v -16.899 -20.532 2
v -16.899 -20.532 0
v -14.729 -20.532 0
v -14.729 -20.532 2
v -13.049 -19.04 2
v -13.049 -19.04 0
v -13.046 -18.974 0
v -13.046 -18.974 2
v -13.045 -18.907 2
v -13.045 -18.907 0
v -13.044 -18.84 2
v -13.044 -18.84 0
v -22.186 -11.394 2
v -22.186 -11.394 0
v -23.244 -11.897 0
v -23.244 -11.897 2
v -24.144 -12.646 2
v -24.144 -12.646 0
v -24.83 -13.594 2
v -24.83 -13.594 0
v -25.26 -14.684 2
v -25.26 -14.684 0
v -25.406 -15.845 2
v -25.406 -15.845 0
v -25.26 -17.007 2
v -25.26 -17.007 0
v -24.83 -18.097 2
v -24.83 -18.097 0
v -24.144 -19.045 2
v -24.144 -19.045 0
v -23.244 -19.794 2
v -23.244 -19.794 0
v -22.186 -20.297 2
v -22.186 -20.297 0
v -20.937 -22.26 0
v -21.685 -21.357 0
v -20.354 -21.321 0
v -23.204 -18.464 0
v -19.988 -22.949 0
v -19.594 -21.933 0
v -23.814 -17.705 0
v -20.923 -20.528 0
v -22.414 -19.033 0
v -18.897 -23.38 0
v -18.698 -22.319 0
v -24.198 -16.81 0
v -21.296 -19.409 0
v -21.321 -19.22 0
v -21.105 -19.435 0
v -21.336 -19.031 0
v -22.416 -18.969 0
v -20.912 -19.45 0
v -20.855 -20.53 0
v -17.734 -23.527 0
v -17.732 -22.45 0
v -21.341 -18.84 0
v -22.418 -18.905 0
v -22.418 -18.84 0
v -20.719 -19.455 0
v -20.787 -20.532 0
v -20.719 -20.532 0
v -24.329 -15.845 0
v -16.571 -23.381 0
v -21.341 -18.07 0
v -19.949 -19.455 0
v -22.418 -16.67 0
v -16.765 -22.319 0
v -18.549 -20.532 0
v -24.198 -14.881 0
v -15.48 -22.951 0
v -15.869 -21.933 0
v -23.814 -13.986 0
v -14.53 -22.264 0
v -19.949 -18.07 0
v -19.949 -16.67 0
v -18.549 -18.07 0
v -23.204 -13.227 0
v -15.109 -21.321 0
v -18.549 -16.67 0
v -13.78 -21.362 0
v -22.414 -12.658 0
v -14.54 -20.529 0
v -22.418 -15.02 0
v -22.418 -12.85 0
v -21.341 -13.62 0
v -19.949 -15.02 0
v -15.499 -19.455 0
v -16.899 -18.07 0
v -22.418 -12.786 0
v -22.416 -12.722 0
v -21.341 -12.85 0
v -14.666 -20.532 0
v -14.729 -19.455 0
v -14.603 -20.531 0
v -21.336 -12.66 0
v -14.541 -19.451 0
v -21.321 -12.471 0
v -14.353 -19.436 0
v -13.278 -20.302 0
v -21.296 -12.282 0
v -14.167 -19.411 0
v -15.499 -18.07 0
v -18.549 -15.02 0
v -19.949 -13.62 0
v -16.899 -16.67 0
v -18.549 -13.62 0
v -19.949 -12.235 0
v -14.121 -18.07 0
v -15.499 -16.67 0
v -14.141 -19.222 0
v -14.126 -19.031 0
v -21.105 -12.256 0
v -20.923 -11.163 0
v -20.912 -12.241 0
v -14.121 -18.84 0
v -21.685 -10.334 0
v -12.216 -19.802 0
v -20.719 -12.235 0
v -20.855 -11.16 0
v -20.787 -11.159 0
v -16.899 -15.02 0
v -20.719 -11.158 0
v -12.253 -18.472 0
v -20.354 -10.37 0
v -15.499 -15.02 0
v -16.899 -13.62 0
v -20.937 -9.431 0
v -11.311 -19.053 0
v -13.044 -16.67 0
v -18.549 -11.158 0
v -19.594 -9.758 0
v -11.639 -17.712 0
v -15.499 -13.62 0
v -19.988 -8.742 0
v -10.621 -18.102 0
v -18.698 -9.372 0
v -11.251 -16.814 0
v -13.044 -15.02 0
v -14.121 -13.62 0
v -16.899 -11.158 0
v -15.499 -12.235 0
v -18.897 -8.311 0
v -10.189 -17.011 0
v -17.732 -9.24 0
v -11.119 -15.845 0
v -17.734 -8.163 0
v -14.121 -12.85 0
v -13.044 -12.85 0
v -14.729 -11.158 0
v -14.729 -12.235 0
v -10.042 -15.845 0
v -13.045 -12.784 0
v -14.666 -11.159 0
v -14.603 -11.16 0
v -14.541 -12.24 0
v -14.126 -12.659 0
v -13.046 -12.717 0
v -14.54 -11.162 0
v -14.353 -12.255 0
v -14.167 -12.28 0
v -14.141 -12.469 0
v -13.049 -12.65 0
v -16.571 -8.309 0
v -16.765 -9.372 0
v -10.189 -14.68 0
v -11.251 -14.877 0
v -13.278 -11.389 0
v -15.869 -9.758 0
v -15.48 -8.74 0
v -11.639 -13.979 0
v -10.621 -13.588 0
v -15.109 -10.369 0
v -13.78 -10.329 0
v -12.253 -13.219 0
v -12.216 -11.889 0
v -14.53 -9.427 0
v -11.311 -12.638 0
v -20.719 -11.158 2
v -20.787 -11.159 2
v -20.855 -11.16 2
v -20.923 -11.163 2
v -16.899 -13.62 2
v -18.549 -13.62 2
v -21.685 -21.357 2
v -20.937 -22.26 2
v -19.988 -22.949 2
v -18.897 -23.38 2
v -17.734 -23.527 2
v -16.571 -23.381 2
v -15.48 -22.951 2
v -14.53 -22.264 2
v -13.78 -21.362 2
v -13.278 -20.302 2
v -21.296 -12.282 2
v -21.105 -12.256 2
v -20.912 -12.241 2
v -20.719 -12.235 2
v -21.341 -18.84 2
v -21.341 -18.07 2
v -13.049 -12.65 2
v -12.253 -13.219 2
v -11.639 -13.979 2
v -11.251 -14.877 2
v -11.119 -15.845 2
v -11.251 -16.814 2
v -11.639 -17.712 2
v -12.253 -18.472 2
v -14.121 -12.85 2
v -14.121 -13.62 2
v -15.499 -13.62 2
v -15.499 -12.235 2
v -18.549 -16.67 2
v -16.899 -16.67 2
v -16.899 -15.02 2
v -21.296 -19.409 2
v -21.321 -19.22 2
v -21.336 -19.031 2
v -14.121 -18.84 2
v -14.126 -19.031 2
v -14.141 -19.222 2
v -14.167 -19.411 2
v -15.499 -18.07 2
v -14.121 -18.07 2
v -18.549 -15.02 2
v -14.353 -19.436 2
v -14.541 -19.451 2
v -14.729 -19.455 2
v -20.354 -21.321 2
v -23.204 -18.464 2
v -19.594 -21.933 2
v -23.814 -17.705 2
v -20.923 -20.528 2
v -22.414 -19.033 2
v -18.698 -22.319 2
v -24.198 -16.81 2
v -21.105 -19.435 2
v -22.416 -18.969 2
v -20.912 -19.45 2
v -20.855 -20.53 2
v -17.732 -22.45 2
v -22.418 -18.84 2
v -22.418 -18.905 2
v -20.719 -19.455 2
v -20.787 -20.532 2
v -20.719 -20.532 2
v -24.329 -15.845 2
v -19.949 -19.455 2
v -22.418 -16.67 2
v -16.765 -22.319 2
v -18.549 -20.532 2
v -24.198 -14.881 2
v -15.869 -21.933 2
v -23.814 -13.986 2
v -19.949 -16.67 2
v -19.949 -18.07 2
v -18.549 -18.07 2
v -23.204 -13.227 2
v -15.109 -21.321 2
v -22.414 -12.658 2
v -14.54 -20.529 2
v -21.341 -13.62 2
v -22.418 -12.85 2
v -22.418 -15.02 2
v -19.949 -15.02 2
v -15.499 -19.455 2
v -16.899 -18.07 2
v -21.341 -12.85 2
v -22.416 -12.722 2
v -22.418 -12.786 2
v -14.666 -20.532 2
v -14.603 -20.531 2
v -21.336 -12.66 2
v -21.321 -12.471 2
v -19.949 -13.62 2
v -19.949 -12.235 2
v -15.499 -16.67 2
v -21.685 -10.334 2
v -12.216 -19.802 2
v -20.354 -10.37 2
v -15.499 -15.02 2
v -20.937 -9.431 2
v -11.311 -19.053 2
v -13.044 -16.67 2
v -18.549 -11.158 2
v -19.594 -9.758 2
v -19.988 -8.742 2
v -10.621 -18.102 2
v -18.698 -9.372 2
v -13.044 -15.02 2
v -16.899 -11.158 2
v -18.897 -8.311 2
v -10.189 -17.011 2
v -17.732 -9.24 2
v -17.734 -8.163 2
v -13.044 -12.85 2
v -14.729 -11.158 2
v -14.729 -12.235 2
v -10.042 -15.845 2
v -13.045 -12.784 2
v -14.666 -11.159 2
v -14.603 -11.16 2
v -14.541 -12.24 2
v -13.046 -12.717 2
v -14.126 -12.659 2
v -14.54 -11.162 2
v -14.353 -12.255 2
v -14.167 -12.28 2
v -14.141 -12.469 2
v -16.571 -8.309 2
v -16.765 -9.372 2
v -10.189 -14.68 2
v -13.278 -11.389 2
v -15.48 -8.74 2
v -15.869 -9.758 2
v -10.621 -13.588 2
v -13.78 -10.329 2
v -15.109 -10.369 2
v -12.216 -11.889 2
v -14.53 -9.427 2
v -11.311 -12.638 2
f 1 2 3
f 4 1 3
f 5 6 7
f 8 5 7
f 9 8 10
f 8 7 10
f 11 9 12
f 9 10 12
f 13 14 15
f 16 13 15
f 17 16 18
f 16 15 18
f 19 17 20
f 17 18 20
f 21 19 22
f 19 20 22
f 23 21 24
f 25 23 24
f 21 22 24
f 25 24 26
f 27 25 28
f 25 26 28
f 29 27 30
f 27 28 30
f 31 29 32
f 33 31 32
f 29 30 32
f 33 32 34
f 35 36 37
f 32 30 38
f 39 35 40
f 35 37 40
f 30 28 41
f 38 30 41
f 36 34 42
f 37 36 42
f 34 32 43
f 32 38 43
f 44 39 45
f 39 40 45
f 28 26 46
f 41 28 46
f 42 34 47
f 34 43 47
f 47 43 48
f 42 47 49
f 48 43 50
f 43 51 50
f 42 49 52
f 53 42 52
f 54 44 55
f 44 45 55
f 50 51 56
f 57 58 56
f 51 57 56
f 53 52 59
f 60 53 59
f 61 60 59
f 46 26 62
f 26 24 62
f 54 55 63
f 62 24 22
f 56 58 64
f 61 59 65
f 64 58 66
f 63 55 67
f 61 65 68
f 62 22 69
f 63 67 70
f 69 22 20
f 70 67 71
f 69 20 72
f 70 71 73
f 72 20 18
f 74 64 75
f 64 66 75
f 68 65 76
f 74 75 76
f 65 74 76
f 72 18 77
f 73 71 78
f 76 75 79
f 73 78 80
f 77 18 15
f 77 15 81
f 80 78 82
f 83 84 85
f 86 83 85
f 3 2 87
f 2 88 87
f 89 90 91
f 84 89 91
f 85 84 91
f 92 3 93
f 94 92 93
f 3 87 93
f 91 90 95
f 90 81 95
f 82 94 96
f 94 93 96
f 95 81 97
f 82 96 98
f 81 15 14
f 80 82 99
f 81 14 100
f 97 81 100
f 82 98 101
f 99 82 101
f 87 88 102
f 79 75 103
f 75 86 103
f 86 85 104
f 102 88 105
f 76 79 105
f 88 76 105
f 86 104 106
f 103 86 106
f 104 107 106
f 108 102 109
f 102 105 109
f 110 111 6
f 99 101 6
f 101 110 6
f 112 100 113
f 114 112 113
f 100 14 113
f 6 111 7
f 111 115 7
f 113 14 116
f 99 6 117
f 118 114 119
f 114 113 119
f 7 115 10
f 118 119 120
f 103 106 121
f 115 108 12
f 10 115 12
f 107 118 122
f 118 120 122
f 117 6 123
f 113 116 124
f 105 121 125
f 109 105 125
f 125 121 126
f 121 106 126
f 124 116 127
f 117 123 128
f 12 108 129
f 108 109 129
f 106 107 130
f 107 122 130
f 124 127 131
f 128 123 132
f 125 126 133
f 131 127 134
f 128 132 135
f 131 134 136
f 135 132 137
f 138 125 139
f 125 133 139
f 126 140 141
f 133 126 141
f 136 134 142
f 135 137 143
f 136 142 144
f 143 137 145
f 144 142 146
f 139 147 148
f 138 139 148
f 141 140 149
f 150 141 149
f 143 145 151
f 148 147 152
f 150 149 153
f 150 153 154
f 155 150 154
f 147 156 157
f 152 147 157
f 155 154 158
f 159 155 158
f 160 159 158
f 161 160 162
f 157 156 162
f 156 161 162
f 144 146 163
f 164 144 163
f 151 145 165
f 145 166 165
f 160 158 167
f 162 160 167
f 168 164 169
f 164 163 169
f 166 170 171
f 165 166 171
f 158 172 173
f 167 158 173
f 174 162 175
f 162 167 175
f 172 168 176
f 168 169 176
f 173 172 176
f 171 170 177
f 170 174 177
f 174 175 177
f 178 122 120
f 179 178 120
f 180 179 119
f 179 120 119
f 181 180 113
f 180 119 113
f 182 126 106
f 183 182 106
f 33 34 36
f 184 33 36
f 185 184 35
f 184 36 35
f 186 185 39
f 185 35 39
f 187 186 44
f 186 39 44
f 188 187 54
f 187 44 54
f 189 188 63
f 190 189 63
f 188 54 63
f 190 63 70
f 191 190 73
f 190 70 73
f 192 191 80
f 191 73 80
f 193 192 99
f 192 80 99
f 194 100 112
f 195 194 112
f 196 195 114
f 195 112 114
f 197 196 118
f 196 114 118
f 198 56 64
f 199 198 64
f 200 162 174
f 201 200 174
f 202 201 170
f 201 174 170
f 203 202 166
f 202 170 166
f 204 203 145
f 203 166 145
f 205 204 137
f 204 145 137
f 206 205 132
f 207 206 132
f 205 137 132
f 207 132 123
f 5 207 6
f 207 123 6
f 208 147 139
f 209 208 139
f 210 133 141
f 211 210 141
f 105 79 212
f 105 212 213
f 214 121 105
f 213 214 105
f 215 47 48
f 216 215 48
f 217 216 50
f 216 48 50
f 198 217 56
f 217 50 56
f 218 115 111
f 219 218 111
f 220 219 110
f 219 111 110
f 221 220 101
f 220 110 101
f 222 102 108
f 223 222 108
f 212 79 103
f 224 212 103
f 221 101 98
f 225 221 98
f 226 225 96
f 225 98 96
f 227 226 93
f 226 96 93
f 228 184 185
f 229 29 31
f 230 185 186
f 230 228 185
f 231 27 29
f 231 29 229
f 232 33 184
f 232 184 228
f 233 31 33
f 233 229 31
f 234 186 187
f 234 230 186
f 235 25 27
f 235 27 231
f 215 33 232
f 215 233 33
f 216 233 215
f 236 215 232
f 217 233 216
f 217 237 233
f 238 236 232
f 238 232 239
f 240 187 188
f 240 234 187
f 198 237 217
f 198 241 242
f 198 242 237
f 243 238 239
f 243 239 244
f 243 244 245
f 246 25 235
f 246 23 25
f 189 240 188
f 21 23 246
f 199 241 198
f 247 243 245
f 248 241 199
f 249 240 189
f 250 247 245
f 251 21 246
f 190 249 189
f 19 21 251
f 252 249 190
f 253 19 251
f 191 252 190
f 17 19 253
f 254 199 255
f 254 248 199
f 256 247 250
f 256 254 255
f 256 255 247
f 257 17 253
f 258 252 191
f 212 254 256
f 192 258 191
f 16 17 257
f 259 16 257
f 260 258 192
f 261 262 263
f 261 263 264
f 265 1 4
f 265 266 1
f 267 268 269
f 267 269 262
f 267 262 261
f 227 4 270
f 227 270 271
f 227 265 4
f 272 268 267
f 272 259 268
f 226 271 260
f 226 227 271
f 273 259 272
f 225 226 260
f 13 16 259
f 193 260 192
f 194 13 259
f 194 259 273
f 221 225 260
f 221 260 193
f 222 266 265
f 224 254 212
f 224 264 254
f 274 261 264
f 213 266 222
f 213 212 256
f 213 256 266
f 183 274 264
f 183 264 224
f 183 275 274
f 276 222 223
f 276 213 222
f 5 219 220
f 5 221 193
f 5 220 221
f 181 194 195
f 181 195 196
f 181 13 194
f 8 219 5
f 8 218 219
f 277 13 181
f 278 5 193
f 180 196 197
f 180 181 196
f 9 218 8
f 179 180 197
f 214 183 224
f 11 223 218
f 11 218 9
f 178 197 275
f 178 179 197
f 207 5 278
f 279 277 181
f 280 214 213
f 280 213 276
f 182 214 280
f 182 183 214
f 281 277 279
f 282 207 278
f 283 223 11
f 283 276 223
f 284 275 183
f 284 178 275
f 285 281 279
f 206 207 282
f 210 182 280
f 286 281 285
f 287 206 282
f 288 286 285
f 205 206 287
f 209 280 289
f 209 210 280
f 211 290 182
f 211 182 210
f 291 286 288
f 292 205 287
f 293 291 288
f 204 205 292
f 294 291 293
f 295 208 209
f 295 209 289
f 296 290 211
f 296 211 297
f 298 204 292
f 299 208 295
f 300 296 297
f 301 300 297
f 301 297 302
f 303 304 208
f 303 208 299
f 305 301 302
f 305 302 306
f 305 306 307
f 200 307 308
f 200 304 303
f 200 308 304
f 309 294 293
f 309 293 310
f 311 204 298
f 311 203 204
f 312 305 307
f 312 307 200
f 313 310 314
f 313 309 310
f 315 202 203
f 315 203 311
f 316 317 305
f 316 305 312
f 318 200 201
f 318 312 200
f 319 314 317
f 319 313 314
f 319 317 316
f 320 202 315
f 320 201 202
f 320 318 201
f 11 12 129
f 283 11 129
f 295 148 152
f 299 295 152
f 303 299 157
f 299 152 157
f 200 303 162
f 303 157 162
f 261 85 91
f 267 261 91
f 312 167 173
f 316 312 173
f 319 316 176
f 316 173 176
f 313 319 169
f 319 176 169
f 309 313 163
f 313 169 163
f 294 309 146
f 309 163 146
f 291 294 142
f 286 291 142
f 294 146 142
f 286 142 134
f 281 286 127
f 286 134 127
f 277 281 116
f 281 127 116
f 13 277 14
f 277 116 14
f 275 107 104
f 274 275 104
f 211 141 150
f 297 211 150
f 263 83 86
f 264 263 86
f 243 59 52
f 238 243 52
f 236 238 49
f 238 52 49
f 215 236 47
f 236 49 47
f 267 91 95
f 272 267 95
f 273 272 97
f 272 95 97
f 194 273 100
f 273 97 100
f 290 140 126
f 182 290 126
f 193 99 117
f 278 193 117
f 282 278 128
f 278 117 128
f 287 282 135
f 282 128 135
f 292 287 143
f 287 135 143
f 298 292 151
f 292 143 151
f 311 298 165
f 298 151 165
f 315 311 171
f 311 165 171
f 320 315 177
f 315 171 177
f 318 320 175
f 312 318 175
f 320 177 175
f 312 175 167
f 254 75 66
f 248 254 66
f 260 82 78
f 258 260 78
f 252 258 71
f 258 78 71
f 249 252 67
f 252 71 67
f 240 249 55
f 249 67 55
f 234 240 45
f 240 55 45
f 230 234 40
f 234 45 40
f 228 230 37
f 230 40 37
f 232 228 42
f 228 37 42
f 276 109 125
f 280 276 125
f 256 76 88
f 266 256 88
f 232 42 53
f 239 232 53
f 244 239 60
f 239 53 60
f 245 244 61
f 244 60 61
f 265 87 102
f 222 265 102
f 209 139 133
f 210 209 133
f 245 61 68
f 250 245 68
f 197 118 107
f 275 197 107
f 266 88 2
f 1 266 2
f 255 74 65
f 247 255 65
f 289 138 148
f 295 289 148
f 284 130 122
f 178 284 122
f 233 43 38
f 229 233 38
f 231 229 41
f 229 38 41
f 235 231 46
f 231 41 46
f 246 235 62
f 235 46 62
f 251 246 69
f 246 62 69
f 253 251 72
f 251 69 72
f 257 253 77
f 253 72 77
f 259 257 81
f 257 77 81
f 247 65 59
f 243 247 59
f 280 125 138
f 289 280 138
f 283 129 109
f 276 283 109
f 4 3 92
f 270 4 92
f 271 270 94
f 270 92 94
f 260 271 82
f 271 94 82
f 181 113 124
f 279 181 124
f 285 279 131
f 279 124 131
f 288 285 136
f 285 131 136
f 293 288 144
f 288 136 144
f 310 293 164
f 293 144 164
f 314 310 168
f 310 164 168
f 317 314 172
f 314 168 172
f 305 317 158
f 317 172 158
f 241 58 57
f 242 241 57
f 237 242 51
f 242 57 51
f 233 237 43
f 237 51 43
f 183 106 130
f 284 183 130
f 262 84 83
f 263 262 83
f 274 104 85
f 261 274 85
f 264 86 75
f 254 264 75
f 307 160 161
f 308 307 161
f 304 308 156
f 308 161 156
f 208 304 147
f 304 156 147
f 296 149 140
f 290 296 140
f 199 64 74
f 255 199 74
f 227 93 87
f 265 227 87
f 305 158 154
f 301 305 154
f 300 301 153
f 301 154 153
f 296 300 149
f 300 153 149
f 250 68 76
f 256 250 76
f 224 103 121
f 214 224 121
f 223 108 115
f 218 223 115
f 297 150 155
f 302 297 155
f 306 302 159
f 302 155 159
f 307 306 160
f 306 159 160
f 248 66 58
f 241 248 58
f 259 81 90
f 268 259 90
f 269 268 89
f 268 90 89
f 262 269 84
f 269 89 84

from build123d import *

# Parameters (mm, degrees)
F0_W     = 1.4
F0_H     = 1.4
F0_W_2   = 1.65
F0_H_2   = 1.65
F1_DEPTH = 2


with BuildPart() as f1:
    # F0 (on Top) → F1 (new body)
    with BuildSketch(Plane.XY):
        with BuildLine():
            ThreePointArc((-21.2961866601, -12.2818885401), (-21.155367688, -11.7070138204), (-20.9225061022, -11.1628755952))
            ThreePointArc((-20.9225061022, -11.1628755952), (-21.5623124485, -11.234937617), (-22.186206323, -11.3940021608))
            ThreePointArc((-22.186206323, -11.3940021608), (-22.3437732086, -12.0182759568), (-22.4142996364, -12.6582533929))
            ThreePointArc((-22.4142996364, -12.6582533929), (-21.8707217917, -12.4240866724), (-21.2961866601, -12.2818885401))
        make_face()
        with BuildLine():
            ThreePointArc((-22.186206323, -11.3940021608), (-21.5623124485, -11.234937617), (-20.9225061022, -11.1628755952))
            ThreePointArc((-20.9225061022, -11.1628755952), (-17.7315900511, -9.2404582472), (-14.5403036541, -11.1622607443))
            ThreePointArc((-14.5403036541, -11.1622607443), (-13.9013713953, -11.2321194541), (-13.278004152, -11.3887334725))
            ThreePointArc((-13.278004152, -11.3887334725), (-17.7340143596, -8.1634590502), (-22.186206323, -11.3940021608))
        make_face()
        with BuildLine():
            ThreePointArc((-22.4142996364, -12.6582533929), (-22.3437732086, -12.0182759568), (-22.186206323, -11.3940021608))
            ThreePointArc((-22.186206323, -11.3940021608), (-25.4060635692, -15.8454582305), (-22.186206323, -20.2969143001))
            ThreePointArc((-22.186206323, -20.2969143001), (-22.3437732086, -19.6726405041), (-22.4142996364, -19.032663068))
            ThreePointArc((-22.4142996364, -19.032663068), (-24.3290635692, -15.8454582305), (-22.4142996364, -12.6582533929))
        make_face()
        with BuildLine():
            ThreePointArc((-13.278004152, -11.3887334725), (-13.9013713953, -11.2321194541), (-14.5403036541, -11.1622607443))
            ThreePointArc((-14.5403036541, -11.1622607443), (-14.3076050054, -11.7055530453), (-14.1666742594, -12.2795336289))
            ThreePointArc((-14.1666742594, -12.2795336289), (-13.5923579293, -12.4190898486), (-13.0485100994, -12.6504871765))
            ThreePointArc((-13.0485100994, -12.6504871765), (-13.1198982272, -12.011723992), (-13.278004152, -11.3887334725))
        make_face()
        with BuildLine():
            ThreePointArc((-22.4142996364, -19.032663068), (-22.3437732086, -19.6726405041), (-22.186206323, -20.2969143001))
            ThreePointArc((-22.186206323, -20.2969143001), (-21.5623124485, -20.455978844), (-20.9225061022, -20.5280408657))
            ThreePointArc((-20.9225061022, -20.5280408657), (-21.155367688, -19.9839026405), (-21.2961866601, -19.4090279208))
            ThreePointArc((-21.2961866601, -19.4090279208), (-21.8707217917, -19.2668297885), (-22.4142996364, -19.032663068))
        make_face()
        with BuildLine():
            ThreePointArc((-20.9225061022, -20.5280408657), (-21.5623124485, -20.455978844), (-22.186206323, -20.2969143001))
            ThreePointArc((-22.186206323, -20.2969143001), (-17.7340143596, -23.5274574107), (-13.278004152, -20.3021829884))
            ThreePointArc((-13.278004152, -20.3021829884), (-13.9013713953, -20.4587970068), (-14.5403036541, -20.5286557166))
            ThreePointArc((-14.5403036541, -20.5286557166), (-17.7315900511, -22.4504582137), (-20.9225061022, -20.5280408657))
        make_face()
        with BuildLine():
            ThreePointArc((-13.278004152, -20.3021829884), (-10.0420635692, -15.8454582305), (-13.278004152, -11.3887334725))
            ThreePointArc((-13.278004152, -11.3887334725), (-13.1198982272, -12.011723992), (-13.0485100994, -12.6504871765))
            ThreePointArc((-13.0485100994, -12.6504871765), (-11.1190635692, -15.8454582305), (-13.0485100994, -19.0404292844))
            ThreePointArc((-13.0485100994, -19.0404292844), (-13.1198982272, -19.6791924689), (-13.278004152, -20.3021829884))
        make_face()
        with BuildLine():
            ThreePointArc((-14.5403036541, -20.5286557166), (-13.9013713953, -20.4587970068), (-13.278004152, -20.3021829884))
            ThreePointArc((-13.278004152, -20.3021829884), (-13.1198982272, -19.6791924689), (-13.0485100994, -19.0404292844))
            ThreePointArc((-13.0485100994, -19.0404292844), (-13.5923579293, -19.2718266123), (-14.1666742594, -19.4113828321))
            ThreePointArc((-14.1666742594, -19.4113828321), (-14.3076050054, -19.9853634156), (-14.5403036541, -20.5286557166))
        make_face()
        with BuildLine():
            ThreePointArc((-21.3412422696, -12.8504582305), (-21.3299607394, -12.565282188), (-21.2961866601, -12.2818885401))
            ThreePointArc((-21.2961866601, -12.2818885401), (-21.8707217917, -12.4240866724), (-22.4142996364, -12.6582533929))
            ThreePointArc((-22.4142996364, -12.6582533929), (-22.4172565076, -12.7543355953), (-22.4182422696, -12.8504582305))
            Line((-22.4182422696, -12.8504582305), (-22.4182422696, -15.0204582305))
            Line((-22.4182422696, -15.0204582305), (-19.9490635692, -15.0204582305))
            Line((-19.9490635692, -15.0204582305), (-19.9490635692, -13.6204582305))
            Line((-19.9490635692, -13.6204582305), (-21.3412422696, -13.6204582305))
            Line((-21.3412422696, -13.6204582305), (-21.3412422696, -12.8504582305))
        make_face()
        with Locations((-19.2490635692, -14.3204582305)):
            Rectangle(F0_W, F0_H)
        with BuildLine():
            Line((-18.5490635692, -11.1584582305), (-20.7190635692, -11.1584582305))
            ThreePointArc((-20.7190635692, -11.1584582305), (-20.8208088115, -11.1595627018), (-20.9225061022, -11.1628755952))
            ThreePointArc((-20.9225061022, -11.1628755952), (-21.155367688, -11.7070138204), (-21.2961866601, -12.2818885401))
            ThreePointArc((-21.2961866601, -12.2818885401), (-21.0085574533, -12.2470845296), (-20.7190635692, -12.2354582305))
            Line((-20.7190635692, -12.2354582305), (-19.9490635692, -12.2354582305))
            Line((-19.9490635692, -12.2354582305), (-19.9490635692, -13.6204582305))
            Line((-19.9490635692, -13.6204582305), (-18.5490635692, -13.6204582305))
            Line((-18.5490635692, -13.6204582305), (-18.5490635692, -11.1584582305))
        make_face()
        with Locations((-17.7240635692, -14.3204582305)):
            Rectangle(F0_W_2, F0_H)
        with Locations((-16.1990635692, -14.3204582305)):
            Rectangle(F0_W, F0_H)
        with BuildLine():
            ThreePointArc((-13.0485100994, -12.6504871765), (-13.5923579293, -12.4190898486), (-14.1666742594, -12.2795336289))
            ThreePointArc((-14.1666742594, -12.2795336289), (-14.1326181911, -12.5640935301), (-14.1212422696, -12.8504582305))
            Line((-14.1212422696, -12.8504582305), (-14.1212422696, -13.6204582305))
            Line((-14.1212422696, -13.6204582305), (-15.4990635692, -13.6204582305))
            Line((-15.4990635692, -13.6204582305), (-15.4990635692, -15.0204582305))
            Line((-15.4990635692, -15.0204582305), (-13.0442422696, -15.0204582305))
            Line((-13.0442422696, -15.0204582305), (-13.0442422696, -12.8504582305))
            ThreePointArc((-13.0442422696, -12.8504582305), (-13.0453093485, -12.7504499348), (-13.0485100994, -12.6504871765))
        make_face()
        with BuildLine():
            ThreePointArc((-14.1666742594, -12.2795336289), (-14.3076050054, -11.7055530453), (-14.5403036541, -11.1622607443))
            ThreePointArc((-14.5403036541, -11.1622607443), (-14.6346644635, -11.1594089553), (-14.7290635692, -11.1584582305))
            Line((-14.7290635692, -11.1584582305), (-16.8990635692, -11.1584582305))
            Line((-16.8990635692, -11.1584582305), (-16.8990635692, -13.6204582305))
            Line((-16.8990635692, -13.6204582305), (-15.4990635692, -13.6204582305))
            Line((-15.4990635692, -13.6204582305), (-15.4990635692, -12.2354582305))
            Line((-15.4990635692, -12.2354582305), (-14.7290635692, -12.2354582305))
            ThreePointArc((-14.7290635692, -12.2354582305), (-14.4470066704, -12.2464939481), (-14.1666742594, -12.2795336289))
        make_face()
        with BuildLine():
            ThreePointArc((-14.7290635692, -20.5324582305), (-14.6346644635, -20.5315075056), (-14.5403036541, -20.5286557166))
            ThreePointArc((-14.5403036541, -20.5286557166), (-14.3076050054, -19.9853634156), (-14.1666742594, -19.4113828321))
            ThreePointArc((-14.1666742594, -19.4113828321), (-14.4470066704, -19.4444225128), (-14.7290635692, -19.4554582305))
            Line((-14.7290635692, -19.4554582305), (-15.4990635692, -19.4554582305))
            Line((-15.4990635692, -19.4554582305), (-15.4990635692, -18.0704582305))
            Line((-15.4990635692, -18.0704582305), (-16.8990635692, -18.0704582305))
            Line((-16.8990635692, -18.0704582305), (-16.8990635692, -20.5324582305))
            Line((-16.8990635692, -20.5324582305), (-14.7290635692, -20.5324582305))
        make_face()
        with BuildLine():
            ThreePointArc((-14.1666742594, -19.4113828321), (-13.5923579293, -19.2718266123), (-13.0485100994, -19.0404292844))
            ThreePointArc((-13.0485100994, -19.0404292844), (-13.0453093485, -18.9404665261), (-13.0442422696, -18.8404582305))
            Line((-13.0442422696, -18.8404582305), (-13.0442422696, -16.6704582305))
            Line((-13.0442422696, -16.6704582305), (-15.4990635692, -16.6704582305))
            Line((-15.4990635692, -16.6704582305), (-15.4990635692, -18.0704582305))
            Line((-15.4990635692, -18.0704582305), (-14.1212422696, -18.0704582305))
            Line((-14.1212422696, -18.0704582305), (-14.1212422696, -18.8404582305))
            ThreePointArc((-14.1212422696, -18.8404582305), (-14.1326181911, -19.1268229308), (-14.1666742594, -19.4113828321))
        make_face()
        with Locations((-16.1990635692, -17.3704582305)):
            Rectangle(F0_W, F0_H)
        with Locations((-16.1990635692, -15.8454582305)):
            Rectangle(F0_W, F0_H_2)
        with Locations((-19.2490635692, -17.3704582305)):
            Rectangle(F0_W, F0_H)
        with Locations((-19.2490635692, -15.8454582305)):
            Rectangle(F0_W, F0_H_2)
        with Locations((-17.7240635692, -17.3704582305)):
            Rectangle(F0_W_2, F0_H)
        with BuildLine():
            ThreePointArc((-21.2961866601, -19.4090279208), (-21.155367688, -19.9839026405), (-20.9225061022, -20.5280408657))
            ThreePointArc((-20.9225061022, -20.5280408657), (-20.8208088115, -20.5313537591), (-20.7190635692, -20.5324582305))
            Line((-20.7190635692, -20.5324582305), (-18.5490635692, -20.5324582305))
            Line((-18.5490635692, -20.5324582305), (-18.5490635692, -18.0704582305))
            Line((-18.5490635692, -18.0704582305), (-19.9490635692, -18.0704582305))
            Line((-19.9490635692, -18.0704582305), (-19.9490635692, -19.4554582305))
            Line((-19.9490635692, -19.4554582305), (-20.7190635692, -19.4554582305))
            ThreePointArc((-20.7190635692, -19.4554582305), (-21.0085574533, -19.4438319313), (-21.2961866601, -19.4090279208))
        make_face()
        with BuildLine():
            ThreePointArc((-22.4182422696, -18.8404582305), (-22.4172565076, -18.9365808656), (-22.4142996364, -19.032663068))
            ThreePointArc((-22.4142996364, -19.032663068), (-21.8707217917, -19.2668297885), (-21.2961866601, -19.4090279208))
            ThreePointArc((-21.2961866601, -19.4090279208), (-21.3299607394, -19.1256342729), (-21.3412422696, -18.8404582305))
            Line((-21.3412422696, -18.8404582305), (-21.3412422696, -18.0704582305))
            Line((-21.3412422696, -18.0704582305), (-19.9490635692, -18.0704582305))
            Line((-19.9490635692, -18.0704582305), (-19.9490635692, -16.6704582305))
            Line((-19.9490635692, -16.6704582305), (-22.4182422696, -16.6704582305))
            Line((-22.4182422696, -16.6704582305), (-22.4182422696, -18.8404582305))
        make_face()
    extrude(amount=F1_DEPTH)


solid = f1.part
